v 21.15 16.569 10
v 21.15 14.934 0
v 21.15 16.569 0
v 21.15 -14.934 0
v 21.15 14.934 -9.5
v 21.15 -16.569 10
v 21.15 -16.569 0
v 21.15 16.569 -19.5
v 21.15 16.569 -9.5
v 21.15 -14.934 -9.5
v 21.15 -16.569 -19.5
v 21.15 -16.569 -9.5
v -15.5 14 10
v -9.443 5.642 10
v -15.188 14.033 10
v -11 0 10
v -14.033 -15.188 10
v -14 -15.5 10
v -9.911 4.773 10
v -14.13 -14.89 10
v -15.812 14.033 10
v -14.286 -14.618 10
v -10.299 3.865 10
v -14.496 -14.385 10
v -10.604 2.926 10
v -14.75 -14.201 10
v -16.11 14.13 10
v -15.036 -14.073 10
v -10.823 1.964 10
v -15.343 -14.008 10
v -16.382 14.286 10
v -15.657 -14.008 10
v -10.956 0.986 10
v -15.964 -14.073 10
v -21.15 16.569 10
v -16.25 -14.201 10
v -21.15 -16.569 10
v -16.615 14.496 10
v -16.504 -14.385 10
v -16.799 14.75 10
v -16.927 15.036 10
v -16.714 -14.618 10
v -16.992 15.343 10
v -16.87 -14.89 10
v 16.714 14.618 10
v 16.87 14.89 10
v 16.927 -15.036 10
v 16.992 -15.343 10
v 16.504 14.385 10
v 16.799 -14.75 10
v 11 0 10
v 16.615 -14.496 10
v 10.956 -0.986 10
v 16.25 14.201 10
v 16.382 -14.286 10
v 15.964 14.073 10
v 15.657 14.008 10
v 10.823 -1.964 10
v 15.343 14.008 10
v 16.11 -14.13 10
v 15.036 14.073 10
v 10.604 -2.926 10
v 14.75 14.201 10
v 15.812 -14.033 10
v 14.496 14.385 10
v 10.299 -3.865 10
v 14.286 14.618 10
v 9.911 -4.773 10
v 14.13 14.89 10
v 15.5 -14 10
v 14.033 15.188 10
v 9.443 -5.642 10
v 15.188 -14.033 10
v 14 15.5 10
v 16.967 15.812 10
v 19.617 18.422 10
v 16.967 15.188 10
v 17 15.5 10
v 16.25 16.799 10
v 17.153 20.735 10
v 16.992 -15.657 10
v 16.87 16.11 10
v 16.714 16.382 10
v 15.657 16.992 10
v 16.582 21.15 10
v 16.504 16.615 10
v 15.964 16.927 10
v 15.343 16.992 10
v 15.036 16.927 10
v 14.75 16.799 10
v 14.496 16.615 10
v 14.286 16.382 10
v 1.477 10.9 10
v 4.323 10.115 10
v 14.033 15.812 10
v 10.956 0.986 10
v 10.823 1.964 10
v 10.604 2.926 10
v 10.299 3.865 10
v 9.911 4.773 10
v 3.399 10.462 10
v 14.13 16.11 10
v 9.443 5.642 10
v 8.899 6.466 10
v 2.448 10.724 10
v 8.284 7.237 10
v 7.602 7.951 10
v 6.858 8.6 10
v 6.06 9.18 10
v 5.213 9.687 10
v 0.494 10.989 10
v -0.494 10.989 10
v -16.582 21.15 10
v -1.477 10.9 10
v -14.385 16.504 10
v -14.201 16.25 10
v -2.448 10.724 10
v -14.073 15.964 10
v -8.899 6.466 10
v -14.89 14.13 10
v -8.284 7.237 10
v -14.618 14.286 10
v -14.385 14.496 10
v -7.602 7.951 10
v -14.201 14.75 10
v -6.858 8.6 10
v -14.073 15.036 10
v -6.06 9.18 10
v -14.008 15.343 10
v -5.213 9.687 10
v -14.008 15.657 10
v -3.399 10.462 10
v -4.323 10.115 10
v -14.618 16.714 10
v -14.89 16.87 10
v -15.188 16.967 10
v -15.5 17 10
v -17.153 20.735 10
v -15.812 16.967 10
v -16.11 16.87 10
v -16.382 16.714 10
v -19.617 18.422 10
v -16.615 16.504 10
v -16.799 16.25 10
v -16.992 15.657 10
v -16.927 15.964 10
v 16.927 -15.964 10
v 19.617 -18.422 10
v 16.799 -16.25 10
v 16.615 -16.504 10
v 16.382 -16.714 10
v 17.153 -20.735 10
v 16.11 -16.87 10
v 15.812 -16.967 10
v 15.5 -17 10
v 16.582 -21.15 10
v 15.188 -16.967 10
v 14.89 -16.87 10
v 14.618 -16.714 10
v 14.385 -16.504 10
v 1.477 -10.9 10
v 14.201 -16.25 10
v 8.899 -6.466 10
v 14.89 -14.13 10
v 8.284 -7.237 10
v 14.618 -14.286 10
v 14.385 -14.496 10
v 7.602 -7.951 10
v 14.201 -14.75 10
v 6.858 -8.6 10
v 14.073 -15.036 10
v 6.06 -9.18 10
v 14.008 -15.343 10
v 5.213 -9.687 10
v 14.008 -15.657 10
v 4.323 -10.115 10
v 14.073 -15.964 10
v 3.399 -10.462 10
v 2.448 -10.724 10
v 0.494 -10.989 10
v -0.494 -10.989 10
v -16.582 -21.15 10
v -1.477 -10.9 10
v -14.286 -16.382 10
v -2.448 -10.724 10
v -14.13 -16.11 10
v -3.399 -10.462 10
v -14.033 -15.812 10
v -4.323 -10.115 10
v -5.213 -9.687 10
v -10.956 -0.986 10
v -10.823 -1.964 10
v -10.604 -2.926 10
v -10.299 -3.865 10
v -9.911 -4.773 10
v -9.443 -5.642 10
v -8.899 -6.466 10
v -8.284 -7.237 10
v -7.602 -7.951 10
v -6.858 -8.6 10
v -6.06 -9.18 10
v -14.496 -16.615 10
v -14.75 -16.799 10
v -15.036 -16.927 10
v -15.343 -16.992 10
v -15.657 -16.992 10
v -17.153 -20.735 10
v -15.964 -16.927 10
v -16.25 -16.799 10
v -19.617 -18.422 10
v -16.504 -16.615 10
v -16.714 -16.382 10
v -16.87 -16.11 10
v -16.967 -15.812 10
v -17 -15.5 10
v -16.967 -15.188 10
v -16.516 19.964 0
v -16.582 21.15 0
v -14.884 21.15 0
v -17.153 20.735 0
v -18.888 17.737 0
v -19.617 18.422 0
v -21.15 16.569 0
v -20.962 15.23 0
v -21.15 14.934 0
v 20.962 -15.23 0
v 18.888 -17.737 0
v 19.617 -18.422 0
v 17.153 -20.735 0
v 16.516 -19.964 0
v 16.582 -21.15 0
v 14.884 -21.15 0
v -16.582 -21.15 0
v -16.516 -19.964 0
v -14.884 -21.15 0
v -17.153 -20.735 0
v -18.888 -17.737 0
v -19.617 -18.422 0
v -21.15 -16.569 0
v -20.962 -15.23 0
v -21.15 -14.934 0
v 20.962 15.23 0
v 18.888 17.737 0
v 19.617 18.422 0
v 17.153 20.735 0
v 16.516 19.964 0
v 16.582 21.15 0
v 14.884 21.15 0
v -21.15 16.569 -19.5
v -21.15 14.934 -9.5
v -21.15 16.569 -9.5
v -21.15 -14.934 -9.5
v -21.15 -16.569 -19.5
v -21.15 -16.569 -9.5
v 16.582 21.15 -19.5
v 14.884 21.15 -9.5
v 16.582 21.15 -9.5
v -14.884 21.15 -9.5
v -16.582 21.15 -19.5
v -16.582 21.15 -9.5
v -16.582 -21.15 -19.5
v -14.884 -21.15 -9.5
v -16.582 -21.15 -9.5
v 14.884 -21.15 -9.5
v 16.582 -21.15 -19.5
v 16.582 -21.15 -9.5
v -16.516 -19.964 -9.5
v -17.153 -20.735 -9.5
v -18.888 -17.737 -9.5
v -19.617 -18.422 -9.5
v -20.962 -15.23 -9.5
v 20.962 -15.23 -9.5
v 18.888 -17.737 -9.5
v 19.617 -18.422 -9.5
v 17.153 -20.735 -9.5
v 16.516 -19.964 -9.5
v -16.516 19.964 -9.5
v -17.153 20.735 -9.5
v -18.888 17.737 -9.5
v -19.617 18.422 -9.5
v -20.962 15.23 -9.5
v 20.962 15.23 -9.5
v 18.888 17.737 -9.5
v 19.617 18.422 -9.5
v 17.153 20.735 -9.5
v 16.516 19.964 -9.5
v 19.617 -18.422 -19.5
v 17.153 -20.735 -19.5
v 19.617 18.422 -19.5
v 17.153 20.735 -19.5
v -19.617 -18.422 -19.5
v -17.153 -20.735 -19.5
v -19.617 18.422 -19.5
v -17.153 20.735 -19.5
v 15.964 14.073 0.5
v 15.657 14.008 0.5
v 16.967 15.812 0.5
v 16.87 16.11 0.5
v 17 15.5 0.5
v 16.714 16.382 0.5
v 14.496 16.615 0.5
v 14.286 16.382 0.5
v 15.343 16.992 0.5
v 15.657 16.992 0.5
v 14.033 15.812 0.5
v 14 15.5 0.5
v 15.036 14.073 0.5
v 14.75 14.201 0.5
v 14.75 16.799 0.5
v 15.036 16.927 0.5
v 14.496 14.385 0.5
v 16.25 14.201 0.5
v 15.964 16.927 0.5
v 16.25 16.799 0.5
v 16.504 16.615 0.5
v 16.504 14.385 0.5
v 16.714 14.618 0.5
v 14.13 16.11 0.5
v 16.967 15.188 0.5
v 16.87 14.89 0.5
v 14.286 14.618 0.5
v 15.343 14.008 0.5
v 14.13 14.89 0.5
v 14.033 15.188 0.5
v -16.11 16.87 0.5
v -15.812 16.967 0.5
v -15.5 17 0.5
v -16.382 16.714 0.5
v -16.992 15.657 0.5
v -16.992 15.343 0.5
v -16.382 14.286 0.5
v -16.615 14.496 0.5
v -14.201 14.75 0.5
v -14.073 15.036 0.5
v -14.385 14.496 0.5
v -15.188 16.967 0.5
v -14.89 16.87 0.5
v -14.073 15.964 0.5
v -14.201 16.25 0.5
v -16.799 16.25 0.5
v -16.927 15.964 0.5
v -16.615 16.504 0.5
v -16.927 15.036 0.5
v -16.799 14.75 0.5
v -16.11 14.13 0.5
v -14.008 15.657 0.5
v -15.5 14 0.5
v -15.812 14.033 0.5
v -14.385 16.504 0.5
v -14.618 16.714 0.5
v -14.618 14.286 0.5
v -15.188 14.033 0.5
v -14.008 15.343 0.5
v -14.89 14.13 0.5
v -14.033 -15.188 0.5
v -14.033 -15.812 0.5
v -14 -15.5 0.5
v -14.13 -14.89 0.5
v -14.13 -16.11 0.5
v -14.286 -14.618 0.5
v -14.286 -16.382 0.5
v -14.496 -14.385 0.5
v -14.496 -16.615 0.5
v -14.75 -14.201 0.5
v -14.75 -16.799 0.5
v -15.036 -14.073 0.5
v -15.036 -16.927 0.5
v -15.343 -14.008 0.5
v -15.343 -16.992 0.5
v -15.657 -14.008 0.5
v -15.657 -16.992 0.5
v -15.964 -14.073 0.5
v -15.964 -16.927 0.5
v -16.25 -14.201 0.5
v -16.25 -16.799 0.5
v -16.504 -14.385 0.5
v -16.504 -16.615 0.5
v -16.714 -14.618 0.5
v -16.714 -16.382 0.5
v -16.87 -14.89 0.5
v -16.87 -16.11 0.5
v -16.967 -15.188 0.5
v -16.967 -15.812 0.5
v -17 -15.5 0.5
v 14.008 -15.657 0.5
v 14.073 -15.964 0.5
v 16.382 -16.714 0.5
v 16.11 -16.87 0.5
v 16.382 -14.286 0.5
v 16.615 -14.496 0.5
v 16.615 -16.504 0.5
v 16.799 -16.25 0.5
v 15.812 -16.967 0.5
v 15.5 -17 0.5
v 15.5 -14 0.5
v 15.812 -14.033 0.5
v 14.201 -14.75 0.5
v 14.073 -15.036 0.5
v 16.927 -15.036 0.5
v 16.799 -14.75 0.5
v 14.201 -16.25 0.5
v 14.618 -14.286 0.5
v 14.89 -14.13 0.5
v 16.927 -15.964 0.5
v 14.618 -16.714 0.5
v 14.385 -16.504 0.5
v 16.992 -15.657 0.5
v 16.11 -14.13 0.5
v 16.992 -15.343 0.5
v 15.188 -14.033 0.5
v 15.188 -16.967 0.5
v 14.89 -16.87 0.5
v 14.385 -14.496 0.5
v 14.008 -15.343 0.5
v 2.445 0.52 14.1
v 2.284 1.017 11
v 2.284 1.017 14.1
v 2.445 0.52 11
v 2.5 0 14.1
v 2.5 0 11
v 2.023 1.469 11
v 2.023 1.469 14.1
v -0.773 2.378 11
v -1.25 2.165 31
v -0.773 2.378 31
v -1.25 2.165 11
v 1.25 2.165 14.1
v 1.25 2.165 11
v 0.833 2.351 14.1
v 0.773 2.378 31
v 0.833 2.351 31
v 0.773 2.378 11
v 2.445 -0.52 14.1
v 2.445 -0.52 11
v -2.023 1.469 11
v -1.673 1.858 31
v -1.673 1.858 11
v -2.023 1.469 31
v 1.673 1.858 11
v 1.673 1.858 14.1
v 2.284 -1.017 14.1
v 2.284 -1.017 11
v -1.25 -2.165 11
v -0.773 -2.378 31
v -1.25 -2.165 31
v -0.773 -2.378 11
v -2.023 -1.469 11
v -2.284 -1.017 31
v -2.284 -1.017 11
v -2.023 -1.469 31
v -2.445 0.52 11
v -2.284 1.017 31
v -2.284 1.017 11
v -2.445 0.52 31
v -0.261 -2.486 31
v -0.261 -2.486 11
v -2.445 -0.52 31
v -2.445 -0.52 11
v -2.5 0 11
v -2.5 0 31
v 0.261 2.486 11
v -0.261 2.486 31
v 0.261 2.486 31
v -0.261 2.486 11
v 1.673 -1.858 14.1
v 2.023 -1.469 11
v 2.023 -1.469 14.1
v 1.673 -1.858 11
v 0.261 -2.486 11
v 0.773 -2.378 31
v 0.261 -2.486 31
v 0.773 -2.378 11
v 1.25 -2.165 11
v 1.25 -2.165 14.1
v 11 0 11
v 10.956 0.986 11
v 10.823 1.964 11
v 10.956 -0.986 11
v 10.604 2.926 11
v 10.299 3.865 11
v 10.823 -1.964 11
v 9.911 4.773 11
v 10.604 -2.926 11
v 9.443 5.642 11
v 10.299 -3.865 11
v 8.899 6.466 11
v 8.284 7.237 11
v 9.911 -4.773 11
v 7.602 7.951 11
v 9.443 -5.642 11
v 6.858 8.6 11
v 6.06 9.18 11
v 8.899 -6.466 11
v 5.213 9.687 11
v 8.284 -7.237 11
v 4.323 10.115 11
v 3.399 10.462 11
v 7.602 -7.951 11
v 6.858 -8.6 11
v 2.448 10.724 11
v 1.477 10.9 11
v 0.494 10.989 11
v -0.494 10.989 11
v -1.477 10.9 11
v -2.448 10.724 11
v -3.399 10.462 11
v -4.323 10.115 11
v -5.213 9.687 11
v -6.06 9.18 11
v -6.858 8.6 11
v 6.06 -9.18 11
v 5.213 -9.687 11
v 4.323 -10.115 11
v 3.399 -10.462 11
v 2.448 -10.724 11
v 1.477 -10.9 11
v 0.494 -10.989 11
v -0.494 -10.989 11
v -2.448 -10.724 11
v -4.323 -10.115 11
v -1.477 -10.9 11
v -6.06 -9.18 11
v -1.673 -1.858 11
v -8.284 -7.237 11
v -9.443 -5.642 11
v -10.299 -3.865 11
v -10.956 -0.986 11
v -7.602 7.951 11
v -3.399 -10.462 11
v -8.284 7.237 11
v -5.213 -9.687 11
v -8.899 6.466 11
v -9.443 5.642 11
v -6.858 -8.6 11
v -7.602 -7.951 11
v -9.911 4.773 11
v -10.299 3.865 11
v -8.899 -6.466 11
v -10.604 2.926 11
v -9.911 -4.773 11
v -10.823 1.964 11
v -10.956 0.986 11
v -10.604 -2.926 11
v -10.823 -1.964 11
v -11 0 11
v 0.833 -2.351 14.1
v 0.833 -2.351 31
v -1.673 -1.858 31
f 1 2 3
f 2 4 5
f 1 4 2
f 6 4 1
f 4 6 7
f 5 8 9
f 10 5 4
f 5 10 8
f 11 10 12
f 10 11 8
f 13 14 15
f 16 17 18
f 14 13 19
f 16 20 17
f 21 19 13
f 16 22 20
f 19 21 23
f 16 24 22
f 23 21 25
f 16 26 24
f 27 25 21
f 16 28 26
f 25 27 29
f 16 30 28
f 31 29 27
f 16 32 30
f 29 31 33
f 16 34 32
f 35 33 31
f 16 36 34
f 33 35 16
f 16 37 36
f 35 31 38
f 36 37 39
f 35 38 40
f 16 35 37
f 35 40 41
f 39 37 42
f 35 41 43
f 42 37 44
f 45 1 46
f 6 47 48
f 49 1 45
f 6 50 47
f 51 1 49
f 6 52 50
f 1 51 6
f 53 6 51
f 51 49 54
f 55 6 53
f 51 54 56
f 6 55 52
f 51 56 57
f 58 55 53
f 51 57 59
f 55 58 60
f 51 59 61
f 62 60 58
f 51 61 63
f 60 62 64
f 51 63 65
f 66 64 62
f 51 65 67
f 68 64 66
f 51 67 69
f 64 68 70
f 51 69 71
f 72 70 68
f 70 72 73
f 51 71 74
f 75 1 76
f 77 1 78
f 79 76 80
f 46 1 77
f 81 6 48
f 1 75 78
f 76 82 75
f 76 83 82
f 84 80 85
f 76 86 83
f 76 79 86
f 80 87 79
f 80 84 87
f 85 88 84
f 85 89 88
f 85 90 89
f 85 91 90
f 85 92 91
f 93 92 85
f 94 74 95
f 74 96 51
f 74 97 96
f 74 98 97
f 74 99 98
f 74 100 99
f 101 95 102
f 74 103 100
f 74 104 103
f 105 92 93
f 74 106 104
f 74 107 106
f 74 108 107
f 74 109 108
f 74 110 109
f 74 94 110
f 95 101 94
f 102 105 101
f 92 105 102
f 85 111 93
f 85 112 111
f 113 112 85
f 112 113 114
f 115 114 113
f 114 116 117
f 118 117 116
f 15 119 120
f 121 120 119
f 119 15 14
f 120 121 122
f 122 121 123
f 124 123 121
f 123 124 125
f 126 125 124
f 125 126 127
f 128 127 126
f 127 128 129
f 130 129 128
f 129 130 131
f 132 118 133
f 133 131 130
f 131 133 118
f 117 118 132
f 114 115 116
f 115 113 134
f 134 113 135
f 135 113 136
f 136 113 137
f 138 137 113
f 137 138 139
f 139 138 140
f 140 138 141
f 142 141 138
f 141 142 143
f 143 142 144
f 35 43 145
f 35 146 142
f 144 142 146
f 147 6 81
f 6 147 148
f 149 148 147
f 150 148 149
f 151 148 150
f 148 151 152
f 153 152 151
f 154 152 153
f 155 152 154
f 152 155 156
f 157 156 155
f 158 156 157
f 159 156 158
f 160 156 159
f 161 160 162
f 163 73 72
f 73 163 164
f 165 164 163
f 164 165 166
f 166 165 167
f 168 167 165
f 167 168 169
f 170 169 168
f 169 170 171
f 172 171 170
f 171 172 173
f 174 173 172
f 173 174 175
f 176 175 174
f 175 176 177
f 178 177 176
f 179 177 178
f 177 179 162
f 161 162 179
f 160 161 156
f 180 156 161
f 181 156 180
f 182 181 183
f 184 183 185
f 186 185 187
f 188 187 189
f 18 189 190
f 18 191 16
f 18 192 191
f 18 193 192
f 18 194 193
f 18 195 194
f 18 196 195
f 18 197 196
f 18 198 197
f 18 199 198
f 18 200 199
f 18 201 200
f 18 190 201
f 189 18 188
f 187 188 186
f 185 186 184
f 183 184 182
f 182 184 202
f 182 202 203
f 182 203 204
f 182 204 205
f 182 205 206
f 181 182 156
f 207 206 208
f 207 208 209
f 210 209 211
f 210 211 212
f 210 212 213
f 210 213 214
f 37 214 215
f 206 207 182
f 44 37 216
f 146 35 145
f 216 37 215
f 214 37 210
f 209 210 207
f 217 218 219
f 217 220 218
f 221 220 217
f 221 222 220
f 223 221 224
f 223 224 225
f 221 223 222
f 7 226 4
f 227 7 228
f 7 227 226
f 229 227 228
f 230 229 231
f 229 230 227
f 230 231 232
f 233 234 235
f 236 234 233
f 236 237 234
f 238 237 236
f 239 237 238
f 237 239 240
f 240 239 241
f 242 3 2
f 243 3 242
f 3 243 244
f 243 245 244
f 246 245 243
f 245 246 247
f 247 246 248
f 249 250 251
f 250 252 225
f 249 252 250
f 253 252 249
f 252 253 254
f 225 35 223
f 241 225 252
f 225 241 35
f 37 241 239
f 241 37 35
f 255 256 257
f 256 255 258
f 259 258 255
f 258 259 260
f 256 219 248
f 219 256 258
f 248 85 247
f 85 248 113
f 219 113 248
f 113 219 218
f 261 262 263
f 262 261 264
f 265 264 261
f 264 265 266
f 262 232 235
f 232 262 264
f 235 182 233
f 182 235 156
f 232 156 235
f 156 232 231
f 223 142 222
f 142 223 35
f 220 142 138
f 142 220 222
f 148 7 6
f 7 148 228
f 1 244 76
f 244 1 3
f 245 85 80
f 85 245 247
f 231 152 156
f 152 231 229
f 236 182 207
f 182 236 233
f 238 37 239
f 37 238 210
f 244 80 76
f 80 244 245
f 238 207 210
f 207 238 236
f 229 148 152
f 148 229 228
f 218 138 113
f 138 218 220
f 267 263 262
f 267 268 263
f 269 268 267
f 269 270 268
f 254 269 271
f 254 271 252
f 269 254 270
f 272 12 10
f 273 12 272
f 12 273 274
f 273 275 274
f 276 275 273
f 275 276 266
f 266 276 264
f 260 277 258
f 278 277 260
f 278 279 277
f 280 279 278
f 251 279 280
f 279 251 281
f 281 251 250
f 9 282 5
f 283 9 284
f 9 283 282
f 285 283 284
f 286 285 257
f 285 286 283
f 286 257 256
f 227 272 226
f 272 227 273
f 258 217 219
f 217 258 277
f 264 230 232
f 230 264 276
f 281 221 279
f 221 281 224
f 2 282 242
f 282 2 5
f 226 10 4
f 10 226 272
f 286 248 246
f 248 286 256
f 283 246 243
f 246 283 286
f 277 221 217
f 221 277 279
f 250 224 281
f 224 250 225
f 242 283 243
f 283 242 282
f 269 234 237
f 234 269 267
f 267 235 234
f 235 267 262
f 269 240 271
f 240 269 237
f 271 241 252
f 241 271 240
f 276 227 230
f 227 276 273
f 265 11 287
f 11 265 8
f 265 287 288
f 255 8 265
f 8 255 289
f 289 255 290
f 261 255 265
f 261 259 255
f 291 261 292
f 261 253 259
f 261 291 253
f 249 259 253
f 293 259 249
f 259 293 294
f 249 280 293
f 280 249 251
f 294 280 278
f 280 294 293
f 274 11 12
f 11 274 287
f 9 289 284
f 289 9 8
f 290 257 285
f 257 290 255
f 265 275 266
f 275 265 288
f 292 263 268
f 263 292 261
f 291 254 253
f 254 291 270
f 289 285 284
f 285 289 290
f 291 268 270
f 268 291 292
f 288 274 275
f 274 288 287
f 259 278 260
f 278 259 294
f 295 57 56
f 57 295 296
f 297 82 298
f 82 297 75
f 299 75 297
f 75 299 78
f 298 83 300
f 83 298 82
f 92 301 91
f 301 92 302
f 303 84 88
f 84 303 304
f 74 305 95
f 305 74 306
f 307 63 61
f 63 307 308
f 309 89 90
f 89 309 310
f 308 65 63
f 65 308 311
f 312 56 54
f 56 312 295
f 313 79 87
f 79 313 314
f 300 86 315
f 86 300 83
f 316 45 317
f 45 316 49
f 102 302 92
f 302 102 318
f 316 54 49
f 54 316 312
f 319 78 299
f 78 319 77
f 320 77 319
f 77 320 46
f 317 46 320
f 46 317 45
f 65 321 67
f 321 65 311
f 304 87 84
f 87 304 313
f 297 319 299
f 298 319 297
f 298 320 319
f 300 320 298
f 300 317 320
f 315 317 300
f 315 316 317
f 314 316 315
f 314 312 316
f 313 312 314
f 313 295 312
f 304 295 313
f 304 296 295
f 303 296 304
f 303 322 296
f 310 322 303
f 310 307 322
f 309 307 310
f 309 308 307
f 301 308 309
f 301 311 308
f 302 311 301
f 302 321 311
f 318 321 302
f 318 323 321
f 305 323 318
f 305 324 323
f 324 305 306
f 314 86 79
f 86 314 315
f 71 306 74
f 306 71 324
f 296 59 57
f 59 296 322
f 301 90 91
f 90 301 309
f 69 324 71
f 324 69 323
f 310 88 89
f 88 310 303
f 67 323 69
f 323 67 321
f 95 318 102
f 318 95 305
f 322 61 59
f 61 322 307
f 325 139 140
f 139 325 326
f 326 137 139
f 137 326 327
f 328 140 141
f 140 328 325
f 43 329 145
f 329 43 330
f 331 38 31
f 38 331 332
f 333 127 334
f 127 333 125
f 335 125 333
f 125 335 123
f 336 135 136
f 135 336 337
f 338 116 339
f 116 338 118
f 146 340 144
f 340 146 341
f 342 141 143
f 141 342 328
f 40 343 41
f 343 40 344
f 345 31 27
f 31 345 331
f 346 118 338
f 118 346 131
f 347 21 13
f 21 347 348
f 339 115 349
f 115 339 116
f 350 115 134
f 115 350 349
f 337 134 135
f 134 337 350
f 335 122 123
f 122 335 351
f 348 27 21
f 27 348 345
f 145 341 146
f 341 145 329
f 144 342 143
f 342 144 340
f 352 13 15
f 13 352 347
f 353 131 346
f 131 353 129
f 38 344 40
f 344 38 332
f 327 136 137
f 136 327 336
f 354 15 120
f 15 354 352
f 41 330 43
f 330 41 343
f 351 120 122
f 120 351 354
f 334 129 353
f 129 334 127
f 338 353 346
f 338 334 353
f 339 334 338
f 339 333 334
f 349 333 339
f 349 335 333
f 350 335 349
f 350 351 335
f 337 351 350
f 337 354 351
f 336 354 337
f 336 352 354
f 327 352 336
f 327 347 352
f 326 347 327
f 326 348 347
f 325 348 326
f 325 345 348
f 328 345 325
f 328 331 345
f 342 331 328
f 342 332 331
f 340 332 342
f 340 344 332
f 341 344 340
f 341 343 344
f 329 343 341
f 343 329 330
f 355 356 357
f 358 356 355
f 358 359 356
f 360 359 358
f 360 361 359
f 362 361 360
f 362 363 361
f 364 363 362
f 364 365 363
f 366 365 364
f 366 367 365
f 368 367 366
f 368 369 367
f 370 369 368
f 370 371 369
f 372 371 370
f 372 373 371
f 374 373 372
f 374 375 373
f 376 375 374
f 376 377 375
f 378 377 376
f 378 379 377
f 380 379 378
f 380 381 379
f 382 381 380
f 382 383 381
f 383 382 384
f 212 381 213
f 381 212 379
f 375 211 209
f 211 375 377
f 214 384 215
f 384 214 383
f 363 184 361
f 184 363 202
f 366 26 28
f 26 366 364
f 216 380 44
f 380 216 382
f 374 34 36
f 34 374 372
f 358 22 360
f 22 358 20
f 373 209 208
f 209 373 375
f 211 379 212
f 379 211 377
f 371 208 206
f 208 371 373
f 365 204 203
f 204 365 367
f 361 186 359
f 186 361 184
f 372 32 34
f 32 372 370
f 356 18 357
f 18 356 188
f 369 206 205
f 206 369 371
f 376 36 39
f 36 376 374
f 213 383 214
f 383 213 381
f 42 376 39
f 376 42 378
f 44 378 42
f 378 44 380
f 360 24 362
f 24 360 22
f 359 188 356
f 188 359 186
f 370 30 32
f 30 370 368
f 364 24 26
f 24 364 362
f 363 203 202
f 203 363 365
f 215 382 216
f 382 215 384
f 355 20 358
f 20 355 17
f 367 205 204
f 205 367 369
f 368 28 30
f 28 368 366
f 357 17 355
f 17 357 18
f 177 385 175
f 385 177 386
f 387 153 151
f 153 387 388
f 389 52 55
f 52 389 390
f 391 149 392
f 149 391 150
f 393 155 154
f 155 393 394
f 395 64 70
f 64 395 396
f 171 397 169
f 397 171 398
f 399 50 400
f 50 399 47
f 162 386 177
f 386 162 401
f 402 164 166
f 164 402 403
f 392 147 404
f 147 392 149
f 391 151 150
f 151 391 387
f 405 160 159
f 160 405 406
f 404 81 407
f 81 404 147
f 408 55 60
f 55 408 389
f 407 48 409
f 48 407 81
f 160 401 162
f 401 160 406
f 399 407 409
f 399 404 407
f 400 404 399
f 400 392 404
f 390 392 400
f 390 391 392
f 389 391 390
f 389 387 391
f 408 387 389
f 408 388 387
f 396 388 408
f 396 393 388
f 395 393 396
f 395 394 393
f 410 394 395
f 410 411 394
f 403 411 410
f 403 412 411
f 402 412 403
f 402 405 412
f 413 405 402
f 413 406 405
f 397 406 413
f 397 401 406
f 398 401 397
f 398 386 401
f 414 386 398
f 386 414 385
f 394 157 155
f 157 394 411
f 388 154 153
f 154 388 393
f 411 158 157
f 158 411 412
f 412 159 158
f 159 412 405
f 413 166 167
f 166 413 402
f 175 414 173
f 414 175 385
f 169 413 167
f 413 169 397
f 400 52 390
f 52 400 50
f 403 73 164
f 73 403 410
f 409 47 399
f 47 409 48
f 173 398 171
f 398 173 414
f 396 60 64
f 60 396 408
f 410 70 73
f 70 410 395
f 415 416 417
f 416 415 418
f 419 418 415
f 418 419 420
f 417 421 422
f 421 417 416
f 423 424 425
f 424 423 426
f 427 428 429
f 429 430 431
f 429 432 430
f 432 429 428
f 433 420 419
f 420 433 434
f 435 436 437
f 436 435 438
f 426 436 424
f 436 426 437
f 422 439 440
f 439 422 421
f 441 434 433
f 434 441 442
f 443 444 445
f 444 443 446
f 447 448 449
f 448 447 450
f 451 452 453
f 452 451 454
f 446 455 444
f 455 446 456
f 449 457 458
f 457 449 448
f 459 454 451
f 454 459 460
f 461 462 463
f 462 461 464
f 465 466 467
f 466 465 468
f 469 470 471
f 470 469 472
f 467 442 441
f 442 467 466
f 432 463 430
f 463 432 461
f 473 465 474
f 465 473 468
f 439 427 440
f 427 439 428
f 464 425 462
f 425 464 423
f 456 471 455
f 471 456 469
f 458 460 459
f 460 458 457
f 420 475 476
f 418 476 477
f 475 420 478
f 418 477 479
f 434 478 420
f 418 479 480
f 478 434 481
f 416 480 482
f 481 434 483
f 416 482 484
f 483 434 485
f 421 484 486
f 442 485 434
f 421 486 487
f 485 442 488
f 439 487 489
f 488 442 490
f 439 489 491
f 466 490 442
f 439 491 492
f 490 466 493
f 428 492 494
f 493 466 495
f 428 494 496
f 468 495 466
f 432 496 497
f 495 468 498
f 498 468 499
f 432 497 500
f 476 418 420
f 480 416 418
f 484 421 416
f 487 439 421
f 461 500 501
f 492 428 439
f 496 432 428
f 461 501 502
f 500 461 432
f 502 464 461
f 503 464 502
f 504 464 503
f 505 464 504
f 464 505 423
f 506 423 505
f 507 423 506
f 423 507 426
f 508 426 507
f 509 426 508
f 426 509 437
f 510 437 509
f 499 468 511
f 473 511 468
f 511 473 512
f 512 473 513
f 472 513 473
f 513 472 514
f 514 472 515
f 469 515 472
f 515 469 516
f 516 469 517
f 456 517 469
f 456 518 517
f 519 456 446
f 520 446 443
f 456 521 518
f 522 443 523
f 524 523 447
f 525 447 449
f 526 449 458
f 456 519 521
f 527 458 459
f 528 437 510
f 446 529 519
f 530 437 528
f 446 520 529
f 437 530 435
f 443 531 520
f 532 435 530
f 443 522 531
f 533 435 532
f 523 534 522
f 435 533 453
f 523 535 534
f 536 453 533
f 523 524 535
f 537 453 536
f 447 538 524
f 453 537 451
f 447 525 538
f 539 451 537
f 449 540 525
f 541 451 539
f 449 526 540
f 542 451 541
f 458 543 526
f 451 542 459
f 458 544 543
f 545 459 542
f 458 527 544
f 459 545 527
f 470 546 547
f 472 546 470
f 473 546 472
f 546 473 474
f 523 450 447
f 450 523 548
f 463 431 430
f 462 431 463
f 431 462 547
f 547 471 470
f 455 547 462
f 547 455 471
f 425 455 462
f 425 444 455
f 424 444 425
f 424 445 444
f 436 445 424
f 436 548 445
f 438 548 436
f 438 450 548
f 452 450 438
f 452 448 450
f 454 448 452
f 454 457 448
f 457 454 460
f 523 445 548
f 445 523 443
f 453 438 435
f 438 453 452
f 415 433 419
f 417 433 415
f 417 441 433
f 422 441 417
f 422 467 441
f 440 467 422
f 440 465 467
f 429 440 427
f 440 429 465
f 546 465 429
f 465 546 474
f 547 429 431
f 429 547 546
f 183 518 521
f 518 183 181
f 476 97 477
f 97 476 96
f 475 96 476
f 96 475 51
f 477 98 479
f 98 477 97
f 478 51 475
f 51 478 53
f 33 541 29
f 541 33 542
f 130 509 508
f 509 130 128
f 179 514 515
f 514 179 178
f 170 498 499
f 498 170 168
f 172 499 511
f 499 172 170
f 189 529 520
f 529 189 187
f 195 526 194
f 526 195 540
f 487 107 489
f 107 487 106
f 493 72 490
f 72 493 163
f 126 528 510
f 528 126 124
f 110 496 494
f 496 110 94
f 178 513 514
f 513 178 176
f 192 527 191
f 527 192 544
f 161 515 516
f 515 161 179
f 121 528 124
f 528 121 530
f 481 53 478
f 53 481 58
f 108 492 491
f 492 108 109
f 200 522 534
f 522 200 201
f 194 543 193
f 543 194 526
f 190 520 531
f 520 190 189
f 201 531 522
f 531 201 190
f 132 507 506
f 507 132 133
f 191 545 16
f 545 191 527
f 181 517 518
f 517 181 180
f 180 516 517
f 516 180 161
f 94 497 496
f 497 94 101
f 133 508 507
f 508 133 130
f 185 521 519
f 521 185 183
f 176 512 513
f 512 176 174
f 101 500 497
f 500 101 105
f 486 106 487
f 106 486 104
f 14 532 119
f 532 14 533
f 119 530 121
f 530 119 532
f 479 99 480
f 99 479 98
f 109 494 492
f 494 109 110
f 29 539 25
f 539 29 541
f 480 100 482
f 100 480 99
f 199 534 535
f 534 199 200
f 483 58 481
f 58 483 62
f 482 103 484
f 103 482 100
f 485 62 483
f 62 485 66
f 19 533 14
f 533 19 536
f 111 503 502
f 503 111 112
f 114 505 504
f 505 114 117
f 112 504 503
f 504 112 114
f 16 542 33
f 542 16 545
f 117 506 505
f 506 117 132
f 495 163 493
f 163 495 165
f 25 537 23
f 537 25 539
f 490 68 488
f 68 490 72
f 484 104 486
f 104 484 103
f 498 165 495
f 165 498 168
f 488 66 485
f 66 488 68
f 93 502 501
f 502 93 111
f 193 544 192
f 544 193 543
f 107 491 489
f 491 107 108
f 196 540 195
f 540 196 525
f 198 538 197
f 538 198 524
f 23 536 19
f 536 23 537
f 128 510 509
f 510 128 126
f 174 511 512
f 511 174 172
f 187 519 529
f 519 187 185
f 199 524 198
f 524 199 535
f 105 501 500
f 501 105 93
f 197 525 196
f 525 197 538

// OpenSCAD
$fn=50;


SX17_get_mount_width = 50;
NX17_mount_wall_thick = 3;
NX17_mount_bottom_length = 53;
NX17_mount_top_length = 51;
NX17_mount_crew_hole_diameter = 3.5;
NX17_mount_motor_hole_diameter = 22;
NX17_mount_bottom_hole_diameter = 4;
NX17_mount_bottom_hole_length = 30;
NX17_mount_bottom_hole_distance = 30;
NX17_mount_motor_position = 30;



/*
** 0 - width
** 1 - height
** 2 - mount screw diameter
** 3 - mount screw position
** 4 - mount screw hight
** 5 - shaft hight
** 6 - shaft diameter
** 7 - rim diameter
*/
nema17_1003Params = [42.3, 29.5, 3, 31/2, 10, 5, 20, 22];
nema17_1005Params = [42.3, 40, 3, 31/2, 10, 5, 20, 22];




function SX17_get_width(self)=self[0];
function SX17_get_height(self)=self[1];
function SX17_get_mount_screw_diameter(self)=self[2];
function SX17_get_mount_screw_position(self)=self[3];
function SX17_get_mount_screw_hight(self)=self[4];
function SX17_get_shaft_diameter(self)=self[5];
function SX17_get_shaft_height(self)=self[6];
function SX17_get_rim_diameter(self)=self[7];


module SX17_body(self)
{
    color("gray")
    {
        translate([0,0,5])
        {
            intersection()
            {
                cube([SX17_get_width(self),SX17_get_width(self),10],center=true);
                cylinder(r=sqrt(2*pow(SX17_get_width(self)/2,2))-3,h=10,center=true);
            }
        }
    }
    
    color("black")
    {
        translate([0,0,-(SX17_get_height(self)-20)/2])
        {
            intersection()
            {
                cube([SX17_get_width(self),SX17_get_width(self),SX17_get_height(self)-20],center=true);
                
                cylinder(r=sqrt(2*pow(SX17_get_width(self)/2,2))-4,h=SX17_get_height(self)-20,center=true);
            }
        }
    }
    
    color("gray")
    {
        translate([0,0,-SX17_get_height(self)+15])
        {
            intersection()
            {
                cube([SX17_get_width(self),SX17_get_width(self),10],center=true);
                
                cylinder(r=sqrt(2*pow(SX17_get_width(self)/2,2))-3,h=10,center=true);
            }
        }
    }
}

module SX17_shaft(self)
{
    color([0.35,0.35,0.35])
    {
        translate([0,0,10.5])cylinder(d=SX17_get_rim_diameter(self),h=1,center=true,$fn=70);
        
        difference([0,0,0])
        {
            translate([0,0,11])
                cylinder(d=SX17_get_shaft_diameter(self),h=SX17_get_shaft_height(self),$fn=30);
            
            translate([SX17_get_shaft_diameter(self)/1.5,0,11+SX17_get_shaft_height(self)/2+1.6])
                cube([SX17_get_shaft_diameter(self),SX17_get_shaft_diameter(self),SX17_get_shaft_height(self)-3],center=true);
        }
    }  
}

module SX17_screw_holes(self)
{
    for(i=[0:90:360])
    {
        rotate([0,0,i])
        {
            translate([SX17_get_mount_screw_position(self),SX17_get_mount_screw_position(self),5.5])
                cylinder(d=SX17_get_mount_screw_diameter(self),h=SX17_get_mount_screw_hight(self),center=true,$fn=30);
        }
    }
}

module SX17(self)
{
    difference()
    {
        SX17_body(self);
        
        SX17_screw_holes(self);
    }
    
    SX17_shaft(self);
}




module SX17_mount()
{
    color("gray")
    {
        difference()
        {
            intersection()
            {
                union()
                {
                    translate([0,-2.5/2, NX17_mount_wall_thick/2])
                        cube([SX17_get_mount_width, NX17_mount_bottom_length-2.5, NX17_mount_wall_thick],center=true);  
               
                    translate([0,NX17_mount_bottom_length/2-NX17_mount_wall_thick/2,NX17_mount_top_length/2+2.5/2])
                        cube([SX17_get_mount_width,NX17_mount_wall_thick,NX17_mount_top_length-2.5],center=true);
                   
                   
                    
                   translate([0,NX17_mount_bottom_length/2-2.5,2.5])
                   {
                        rotate([0,90,0])
                            cylinder(d=5,h=SX17_get_mount_width,center=true); 
                   }
                }
                
                union()
                {
                    translate([0,3,0])
                        cylinder(d=70,h=10,center=true);
                    
                    translate([0,NX17_mount_bottom_length/2,NX17_mount_top_length/2-3])
                    {
                        rotate([90,0,0])
                            cylinder(d=70,h=10,center=true);
                    }
                }
            }
            
            translate([0,NX17_mount_bottom_length/2-2.5-3,2.5+3])
            {
                rotate([0,90,0])
                    cylinder(d=5,h=SX17_get_mount_width+1,center=true); 
            }
            
            for(j=[-1:2:1])
            {
                translate([NX17_mount_bottom_hole_distance/2*j,0,0])
                {
                    hull()
                    {
                        for(i=[-1:2:1])
                        {
                            translate([0,NX17_mount_bottom_hole_length/2*i,0])
                                cylinder(d=NX17_mount_bottom_hole_diameter, h=10,center=true);
                        }
                    }
                }
            }
            
            translate([0,0,NX17_mount_motor_position])
            {
                for(i=[0:90:270])
                {
                    rotate([0,i,0])
                    {
                        translate([SX17_get_mount_screw_position(self),NX17_mount_bottom_length/2,SX17_get_mount_screw_position(self)])
                        {
                            rotate([90,0,0])
                                cylinder(d=NX17_mount_crew_hole_diameter, h = 10,center=true);
                        }
                    }
                }
                
                translate([0,NX17_mount_bottom_length/2,0])
                {
                    rotate([90,0,0])
                        cylinder(d=NX17_mount_motor_hole_diameter, h = 10,center=true);
                }
            }
        }
        
        for(i=[-1:2:1])
        {
            translate([(SX17_get_mount_width/2-1)*i,0,0])
            {
                hull()
                {
                    translate([0,NX17_mount_bottom_length/2-17/2,-0.5+3])
                        cube([2,17,1],center=true);
        
                    translate([0,NX17_mount_bottom_length/2-0.5,20/2+3])
                        cube([2,1,20],center=true);
                }
            }
        }
    }
}

//SX17_mount();

//*
SX17(nema17_1003Params);
//SX17_body(nema17_1003Params);
//*/
